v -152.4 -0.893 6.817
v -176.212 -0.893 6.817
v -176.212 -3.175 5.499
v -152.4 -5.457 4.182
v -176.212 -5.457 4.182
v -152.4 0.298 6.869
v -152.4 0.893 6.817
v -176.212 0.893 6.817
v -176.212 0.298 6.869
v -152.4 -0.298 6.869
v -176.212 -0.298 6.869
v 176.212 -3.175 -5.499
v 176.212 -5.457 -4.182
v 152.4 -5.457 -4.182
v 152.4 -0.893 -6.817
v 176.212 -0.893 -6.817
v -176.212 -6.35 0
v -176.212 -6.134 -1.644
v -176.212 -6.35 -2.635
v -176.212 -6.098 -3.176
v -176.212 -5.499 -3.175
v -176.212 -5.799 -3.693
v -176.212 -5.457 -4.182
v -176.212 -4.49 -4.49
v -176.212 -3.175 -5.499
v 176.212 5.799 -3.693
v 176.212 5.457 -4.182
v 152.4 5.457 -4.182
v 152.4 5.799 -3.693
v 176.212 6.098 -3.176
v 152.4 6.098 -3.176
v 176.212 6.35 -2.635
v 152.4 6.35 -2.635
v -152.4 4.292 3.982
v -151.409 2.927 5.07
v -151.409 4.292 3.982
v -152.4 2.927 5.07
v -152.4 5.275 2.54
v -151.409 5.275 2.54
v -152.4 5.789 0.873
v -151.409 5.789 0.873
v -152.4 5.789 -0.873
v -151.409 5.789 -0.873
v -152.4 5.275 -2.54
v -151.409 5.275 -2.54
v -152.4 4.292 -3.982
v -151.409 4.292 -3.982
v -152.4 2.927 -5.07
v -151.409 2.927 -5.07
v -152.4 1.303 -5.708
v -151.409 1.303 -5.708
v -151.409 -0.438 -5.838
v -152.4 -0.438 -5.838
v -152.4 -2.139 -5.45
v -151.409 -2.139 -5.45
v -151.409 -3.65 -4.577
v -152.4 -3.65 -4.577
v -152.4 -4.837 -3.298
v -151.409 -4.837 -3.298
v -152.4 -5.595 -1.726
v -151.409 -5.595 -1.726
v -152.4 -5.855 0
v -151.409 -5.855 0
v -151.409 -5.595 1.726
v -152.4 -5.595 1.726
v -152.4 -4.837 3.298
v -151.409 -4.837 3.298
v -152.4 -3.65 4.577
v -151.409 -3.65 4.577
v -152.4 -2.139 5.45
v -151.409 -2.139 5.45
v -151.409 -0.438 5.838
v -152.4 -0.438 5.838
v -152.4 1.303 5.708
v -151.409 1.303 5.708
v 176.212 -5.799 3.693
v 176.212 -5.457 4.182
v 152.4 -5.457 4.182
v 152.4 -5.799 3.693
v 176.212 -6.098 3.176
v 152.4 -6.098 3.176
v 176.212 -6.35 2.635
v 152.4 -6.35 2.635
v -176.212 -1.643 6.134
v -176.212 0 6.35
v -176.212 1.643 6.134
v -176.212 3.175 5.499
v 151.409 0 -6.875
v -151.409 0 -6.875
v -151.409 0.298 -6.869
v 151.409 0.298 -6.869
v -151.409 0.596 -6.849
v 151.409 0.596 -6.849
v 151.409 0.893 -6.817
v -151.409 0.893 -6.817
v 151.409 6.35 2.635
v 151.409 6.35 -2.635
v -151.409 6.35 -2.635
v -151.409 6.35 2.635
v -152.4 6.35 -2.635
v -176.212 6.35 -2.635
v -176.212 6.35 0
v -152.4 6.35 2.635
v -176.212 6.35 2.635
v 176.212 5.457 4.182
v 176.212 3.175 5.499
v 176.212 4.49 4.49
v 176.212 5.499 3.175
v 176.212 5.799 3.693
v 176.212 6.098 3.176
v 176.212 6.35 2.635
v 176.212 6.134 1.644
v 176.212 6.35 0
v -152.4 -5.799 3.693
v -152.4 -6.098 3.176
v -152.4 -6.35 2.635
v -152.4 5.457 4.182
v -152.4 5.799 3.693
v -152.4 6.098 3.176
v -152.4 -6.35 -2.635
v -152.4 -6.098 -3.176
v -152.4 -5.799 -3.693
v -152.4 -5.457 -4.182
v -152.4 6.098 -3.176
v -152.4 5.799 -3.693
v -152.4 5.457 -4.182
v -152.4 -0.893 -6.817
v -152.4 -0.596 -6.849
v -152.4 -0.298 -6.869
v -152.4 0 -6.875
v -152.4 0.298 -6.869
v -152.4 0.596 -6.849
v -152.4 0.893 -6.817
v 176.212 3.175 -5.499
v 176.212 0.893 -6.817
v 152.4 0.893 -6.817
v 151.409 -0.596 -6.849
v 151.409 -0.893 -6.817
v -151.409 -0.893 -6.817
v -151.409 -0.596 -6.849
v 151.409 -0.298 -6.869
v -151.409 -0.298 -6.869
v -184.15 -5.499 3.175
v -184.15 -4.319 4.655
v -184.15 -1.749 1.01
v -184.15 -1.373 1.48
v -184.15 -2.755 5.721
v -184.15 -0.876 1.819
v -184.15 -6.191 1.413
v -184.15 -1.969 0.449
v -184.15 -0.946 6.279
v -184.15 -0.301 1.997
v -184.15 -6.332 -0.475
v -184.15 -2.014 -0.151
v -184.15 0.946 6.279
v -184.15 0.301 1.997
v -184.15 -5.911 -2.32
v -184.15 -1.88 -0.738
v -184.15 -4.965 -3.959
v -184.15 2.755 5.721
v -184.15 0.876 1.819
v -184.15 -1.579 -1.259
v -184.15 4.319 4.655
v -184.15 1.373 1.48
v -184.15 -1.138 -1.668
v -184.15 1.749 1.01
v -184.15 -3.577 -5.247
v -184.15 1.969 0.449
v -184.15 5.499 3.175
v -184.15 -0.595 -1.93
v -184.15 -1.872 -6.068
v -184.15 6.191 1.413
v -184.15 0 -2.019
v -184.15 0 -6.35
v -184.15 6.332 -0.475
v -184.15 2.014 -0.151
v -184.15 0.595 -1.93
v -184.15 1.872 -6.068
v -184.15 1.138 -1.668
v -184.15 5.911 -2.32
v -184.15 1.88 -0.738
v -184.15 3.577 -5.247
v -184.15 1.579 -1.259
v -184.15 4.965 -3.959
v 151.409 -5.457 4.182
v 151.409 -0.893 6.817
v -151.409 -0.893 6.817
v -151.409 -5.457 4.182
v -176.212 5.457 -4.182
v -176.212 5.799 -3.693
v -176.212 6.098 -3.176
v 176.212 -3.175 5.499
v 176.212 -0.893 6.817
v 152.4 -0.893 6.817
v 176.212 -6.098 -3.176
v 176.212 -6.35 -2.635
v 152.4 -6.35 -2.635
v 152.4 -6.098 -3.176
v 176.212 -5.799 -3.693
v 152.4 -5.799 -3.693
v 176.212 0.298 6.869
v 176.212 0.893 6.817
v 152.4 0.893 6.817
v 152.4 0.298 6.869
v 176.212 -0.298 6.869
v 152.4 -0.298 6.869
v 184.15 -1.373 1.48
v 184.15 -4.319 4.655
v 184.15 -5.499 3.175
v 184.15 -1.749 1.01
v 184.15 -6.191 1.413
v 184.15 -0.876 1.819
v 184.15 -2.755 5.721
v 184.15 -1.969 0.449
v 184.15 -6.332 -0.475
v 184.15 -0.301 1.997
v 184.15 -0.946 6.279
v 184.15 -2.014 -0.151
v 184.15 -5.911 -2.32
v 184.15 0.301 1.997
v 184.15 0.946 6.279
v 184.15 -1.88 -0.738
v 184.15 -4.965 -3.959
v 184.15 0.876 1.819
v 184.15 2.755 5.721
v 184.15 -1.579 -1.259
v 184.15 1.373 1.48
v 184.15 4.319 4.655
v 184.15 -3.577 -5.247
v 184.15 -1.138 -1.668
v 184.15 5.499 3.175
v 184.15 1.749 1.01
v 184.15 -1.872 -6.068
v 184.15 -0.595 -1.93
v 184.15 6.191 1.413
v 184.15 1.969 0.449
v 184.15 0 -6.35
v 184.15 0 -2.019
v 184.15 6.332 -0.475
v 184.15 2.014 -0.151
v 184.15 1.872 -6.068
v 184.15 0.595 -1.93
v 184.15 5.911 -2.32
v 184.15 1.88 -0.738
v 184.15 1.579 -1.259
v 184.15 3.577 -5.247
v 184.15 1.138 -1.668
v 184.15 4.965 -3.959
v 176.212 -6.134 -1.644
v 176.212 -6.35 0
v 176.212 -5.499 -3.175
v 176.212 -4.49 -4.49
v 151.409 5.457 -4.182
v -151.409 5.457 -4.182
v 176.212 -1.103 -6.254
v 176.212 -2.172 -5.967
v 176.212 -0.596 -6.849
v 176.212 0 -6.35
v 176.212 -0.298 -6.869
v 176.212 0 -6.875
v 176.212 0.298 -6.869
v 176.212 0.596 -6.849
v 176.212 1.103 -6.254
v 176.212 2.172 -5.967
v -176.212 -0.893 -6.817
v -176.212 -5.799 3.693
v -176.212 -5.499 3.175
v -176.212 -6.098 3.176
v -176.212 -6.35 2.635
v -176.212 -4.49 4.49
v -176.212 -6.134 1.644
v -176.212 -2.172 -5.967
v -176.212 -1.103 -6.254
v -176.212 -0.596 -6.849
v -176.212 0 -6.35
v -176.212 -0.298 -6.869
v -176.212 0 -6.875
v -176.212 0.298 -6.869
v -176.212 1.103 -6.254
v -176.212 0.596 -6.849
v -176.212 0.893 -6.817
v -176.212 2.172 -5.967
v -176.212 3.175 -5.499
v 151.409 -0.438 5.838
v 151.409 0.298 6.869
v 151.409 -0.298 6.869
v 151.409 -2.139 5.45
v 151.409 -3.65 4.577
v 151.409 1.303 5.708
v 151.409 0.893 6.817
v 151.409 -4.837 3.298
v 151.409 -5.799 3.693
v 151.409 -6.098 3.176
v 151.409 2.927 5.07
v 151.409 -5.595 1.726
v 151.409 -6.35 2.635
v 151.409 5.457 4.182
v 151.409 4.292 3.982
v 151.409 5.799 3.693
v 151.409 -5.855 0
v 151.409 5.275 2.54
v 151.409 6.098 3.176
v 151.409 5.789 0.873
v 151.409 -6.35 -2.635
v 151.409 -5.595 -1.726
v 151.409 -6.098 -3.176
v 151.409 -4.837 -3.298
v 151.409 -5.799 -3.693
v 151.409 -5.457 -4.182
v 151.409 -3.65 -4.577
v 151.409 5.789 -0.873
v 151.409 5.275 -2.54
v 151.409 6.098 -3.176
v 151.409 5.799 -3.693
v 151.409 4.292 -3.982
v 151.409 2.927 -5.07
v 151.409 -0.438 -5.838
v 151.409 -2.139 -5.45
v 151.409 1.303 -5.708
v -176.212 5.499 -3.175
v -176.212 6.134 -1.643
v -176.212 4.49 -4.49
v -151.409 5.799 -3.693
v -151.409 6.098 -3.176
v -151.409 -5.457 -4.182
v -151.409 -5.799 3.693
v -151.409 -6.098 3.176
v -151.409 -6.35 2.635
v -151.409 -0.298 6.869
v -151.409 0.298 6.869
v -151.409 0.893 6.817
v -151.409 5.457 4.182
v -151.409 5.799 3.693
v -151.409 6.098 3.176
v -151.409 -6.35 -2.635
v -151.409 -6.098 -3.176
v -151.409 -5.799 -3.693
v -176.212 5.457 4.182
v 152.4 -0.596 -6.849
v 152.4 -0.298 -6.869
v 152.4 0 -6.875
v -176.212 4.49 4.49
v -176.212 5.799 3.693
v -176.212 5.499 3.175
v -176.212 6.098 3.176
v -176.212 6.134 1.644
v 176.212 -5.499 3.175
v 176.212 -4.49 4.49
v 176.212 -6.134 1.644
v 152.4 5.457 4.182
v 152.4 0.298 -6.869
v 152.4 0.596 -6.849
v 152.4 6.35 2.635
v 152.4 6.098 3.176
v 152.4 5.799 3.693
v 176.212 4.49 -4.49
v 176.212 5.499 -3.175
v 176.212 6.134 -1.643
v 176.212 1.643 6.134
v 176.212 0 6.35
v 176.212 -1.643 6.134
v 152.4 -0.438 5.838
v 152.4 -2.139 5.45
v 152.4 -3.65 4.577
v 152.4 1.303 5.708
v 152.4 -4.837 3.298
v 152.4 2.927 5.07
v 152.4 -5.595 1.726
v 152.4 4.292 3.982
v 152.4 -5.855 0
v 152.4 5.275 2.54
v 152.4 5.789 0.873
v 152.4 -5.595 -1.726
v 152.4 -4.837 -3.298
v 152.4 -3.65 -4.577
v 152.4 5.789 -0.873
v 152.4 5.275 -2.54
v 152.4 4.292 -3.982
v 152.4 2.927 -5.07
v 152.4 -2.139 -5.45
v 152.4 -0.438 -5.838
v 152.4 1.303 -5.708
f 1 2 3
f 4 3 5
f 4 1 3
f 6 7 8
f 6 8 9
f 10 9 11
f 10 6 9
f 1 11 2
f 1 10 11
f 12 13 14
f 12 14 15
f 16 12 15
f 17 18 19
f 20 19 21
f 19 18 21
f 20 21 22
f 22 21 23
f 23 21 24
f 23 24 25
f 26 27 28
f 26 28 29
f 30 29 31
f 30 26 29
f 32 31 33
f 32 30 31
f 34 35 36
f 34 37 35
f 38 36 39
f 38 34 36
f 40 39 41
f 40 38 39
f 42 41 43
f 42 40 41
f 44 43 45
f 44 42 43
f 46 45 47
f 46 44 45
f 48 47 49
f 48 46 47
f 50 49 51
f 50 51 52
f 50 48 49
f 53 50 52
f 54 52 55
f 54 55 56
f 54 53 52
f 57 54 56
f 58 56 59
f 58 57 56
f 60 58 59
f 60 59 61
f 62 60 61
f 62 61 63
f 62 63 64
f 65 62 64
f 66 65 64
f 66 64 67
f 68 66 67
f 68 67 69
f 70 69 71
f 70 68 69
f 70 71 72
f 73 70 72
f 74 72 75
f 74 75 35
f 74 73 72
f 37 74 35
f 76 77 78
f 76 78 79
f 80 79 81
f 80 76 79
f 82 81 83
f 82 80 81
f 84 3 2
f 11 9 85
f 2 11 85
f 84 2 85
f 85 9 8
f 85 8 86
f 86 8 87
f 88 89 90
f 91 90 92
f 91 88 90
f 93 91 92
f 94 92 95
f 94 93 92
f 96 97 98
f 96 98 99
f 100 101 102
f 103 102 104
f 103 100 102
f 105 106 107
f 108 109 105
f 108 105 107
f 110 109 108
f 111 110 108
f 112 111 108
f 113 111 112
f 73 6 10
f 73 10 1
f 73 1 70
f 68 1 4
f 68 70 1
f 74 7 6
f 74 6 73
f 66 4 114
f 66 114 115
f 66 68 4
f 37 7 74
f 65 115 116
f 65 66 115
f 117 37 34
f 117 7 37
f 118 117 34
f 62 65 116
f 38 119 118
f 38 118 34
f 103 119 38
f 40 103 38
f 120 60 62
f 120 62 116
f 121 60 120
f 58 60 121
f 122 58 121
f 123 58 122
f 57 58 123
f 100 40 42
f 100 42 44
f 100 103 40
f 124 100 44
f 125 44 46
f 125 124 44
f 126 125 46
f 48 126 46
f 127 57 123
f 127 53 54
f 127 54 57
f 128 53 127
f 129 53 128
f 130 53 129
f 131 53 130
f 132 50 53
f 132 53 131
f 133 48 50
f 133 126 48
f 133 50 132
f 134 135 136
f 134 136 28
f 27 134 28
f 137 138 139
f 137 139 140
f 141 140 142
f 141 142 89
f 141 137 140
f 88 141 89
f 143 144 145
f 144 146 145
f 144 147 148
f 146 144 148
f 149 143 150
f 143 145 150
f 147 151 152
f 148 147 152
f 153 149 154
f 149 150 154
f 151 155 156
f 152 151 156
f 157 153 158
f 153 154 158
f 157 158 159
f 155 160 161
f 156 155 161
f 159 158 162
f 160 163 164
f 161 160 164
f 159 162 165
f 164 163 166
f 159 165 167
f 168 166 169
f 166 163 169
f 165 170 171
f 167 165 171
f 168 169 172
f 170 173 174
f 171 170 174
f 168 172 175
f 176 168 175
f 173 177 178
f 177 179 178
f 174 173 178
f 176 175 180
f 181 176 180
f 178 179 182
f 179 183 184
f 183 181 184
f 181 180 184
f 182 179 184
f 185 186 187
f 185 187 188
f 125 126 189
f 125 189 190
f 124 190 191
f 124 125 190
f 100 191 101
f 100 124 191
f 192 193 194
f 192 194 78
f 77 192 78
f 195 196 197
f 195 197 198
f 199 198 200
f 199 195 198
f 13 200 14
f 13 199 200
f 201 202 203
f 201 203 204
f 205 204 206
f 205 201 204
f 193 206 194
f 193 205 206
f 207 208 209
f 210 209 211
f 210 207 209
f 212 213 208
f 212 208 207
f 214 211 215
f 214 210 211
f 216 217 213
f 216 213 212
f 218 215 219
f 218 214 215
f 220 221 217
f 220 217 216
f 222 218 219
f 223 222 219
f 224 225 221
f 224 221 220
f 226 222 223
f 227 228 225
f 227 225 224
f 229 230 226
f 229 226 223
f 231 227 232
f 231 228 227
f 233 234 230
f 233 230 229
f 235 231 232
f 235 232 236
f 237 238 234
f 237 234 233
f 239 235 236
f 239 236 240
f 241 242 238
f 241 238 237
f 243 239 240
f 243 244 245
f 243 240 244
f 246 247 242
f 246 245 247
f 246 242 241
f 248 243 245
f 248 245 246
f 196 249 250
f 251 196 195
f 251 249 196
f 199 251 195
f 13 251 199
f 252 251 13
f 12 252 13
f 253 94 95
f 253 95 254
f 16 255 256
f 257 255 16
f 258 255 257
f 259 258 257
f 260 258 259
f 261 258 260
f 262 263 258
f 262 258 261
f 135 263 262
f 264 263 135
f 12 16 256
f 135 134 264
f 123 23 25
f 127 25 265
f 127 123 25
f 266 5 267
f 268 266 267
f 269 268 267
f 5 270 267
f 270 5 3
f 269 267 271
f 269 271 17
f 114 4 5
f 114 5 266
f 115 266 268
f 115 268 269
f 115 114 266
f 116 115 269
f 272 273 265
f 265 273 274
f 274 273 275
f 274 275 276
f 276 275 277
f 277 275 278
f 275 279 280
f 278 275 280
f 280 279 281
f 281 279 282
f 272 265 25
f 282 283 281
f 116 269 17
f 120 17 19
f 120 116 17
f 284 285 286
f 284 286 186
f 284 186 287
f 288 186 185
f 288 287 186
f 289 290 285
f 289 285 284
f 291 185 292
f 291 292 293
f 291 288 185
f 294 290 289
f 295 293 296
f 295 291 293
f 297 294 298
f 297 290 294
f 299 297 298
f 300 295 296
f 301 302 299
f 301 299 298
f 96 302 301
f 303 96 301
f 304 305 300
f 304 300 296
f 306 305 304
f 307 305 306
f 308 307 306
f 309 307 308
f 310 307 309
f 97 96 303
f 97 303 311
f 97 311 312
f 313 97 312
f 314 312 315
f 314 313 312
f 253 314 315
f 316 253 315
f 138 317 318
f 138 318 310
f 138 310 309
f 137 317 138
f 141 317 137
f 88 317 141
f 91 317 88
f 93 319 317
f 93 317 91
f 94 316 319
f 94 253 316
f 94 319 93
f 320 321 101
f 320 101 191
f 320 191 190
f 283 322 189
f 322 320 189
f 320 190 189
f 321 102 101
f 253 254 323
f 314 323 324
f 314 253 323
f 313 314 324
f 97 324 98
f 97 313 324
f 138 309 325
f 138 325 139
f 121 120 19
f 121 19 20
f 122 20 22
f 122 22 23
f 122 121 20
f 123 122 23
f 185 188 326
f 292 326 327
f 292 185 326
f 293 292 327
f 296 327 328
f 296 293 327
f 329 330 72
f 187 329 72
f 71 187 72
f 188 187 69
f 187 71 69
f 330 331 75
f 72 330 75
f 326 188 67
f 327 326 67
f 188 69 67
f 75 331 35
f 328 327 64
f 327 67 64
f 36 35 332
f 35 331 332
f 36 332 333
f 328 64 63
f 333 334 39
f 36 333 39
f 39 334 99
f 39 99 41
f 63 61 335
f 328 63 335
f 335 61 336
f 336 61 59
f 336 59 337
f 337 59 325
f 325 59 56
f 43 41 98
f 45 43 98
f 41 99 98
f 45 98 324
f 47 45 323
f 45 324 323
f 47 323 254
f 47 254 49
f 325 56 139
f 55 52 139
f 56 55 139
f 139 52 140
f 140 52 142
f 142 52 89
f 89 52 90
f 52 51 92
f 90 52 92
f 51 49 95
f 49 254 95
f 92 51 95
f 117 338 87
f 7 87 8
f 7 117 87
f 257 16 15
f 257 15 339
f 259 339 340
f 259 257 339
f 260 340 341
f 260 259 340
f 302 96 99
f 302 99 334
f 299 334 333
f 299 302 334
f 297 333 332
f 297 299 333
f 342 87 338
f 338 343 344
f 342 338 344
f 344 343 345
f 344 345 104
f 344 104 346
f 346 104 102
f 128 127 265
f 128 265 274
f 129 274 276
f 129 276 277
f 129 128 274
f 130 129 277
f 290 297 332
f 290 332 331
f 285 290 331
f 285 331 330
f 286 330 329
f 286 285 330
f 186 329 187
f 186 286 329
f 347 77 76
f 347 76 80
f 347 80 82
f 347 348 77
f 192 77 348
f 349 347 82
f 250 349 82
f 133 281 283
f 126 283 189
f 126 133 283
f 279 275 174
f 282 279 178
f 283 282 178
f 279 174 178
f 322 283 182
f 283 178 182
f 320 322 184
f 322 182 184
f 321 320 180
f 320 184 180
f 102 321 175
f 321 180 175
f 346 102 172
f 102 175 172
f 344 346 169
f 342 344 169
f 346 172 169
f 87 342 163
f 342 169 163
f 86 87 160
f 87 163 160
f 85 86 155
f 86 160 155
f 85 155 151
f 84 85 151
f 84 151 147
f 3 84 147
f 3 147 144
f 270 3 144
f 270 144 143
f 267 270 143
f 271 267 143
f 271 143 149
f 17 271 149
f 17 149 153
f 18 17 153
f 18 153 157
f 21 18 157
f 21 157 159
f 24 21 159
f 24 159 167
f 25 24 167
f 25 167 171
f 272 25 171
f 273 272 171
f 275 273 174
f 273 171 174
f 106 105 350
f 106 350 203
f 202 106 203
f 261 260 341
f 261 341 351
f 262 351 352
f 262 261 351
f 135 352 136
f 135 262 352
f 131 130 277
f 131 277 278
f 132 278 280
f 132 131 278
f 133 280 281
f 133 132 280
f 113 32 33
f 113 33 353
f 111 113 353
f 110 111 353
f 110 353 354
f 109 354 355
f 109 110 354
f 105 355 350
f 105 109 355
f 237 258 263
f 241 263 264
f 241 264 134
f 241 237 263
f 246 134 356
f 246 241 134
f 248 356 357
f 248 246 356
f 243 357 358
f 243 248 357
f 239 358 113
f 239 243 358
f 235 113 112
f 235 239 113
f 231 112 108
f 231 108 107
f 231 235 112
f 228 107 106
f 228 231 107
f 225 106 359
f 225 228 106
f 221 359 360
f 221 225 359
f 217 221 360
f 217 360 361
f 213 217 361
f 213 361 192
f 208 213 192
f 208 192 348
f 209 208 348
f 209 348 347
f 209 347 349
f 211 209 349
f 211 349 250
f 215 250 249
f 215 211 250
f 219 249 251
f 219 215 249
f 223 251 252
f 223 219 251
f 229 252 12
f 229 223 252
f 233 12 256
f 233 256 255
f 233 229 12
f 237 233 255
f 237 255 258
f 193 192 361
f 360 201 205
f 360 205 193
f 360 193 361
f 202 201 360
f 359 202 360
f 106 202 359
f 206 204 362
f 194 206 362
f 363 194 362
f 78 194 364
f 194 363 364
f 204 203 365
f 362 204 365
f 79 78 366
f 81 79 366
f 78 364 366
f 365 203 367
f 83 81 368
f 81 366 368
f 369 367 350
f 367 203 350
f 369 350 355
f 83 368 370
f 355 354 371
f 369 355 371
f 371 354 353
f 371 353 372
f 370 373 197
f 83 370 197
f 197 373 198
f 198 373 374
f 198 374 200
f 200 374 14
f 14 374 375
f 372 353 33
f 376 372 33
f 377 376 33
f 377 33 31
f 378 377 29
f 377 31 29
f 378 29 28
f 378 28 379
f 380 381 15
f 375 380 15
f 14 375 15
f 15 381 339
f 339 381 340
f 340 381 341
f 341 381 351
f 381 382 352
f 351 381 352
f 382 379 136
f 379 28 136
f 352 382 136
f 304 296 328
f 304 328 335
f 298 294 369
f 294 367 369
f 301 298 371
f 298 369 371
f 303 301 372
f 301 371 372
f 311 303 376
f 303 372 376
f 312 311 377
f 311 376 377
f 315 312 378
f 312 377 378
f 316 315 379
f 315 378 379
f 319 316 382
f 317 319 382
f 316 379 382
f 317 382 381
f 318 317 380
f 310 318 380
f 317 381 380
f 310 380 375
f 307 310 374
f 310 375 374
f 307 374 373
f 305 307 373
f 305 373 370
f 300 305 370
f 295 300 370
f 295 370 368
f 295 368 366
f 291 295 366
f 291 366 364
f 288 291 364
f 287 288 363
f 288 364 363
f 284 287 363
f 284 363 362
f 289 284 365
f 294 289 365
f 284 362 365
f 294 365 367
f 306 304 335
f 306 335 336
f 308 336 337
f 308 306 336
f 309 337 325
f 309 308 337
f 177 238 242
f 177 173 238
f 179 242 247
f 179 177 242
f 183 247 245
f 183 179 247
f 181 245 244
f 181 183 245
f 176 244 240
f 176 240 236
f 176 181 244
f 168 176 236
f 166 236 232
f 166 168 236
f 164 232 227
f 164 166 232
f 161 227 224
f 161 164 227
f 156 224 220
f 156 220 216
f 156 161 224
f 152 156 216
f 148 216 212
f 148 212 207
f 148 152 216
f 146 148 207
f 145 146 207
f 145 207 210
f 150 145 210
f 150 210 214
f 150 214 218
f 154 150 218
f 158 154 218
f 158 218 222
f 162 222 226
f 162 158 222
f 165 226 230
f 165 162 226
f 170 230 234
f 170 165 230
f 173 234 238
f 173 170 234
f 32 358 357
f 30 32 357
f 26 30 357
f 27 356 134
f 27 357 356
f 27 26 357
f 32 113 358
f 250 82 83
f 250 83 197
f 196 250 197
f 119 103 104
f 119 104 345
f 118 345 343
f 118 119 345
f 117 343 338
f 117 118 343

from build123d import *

# Parameters (mm, degrees)
SKETCH1_R               = 2.0193
BOSS_EXTRUDE1_DEPTH     = 184.15
SKETCH2_R               = 8.89
SKETCH2_R_2             = 6.35
CUT_EXTRUDE_THIN1_DEPTH = 7.9375
SKETCH4_W               = 0.9906
SKETCH4_H               = 2.802626001


with BuildPart() as part:
    # Sketch1 → Boss-Extrude1 (new, symmetric)
    with BuildSketch(Plane(origin=(0, 0, 0), x_dir=(0, 0, -1), z_dir=(1, 0, 0))):
        with BuildLine():
            ThreePointArc((6.874999966, 0), (6.860422465, 0.447468582), (6.816751782, 0.893039571))
            Line((6.816751782, 0.893039571), (4.181770846, 5.456960429))
            ThreePointArc((4.181770846, 5.456960429), (3.437499983, 5.953924622), (2.634980936, 6.35))
            Line((2.634980936, 6.35), (-2.634980936, 6.35))
            ThreePointArc((-2.634980936, 6.35), (-3.437499983, 5.953924622), (-4.181770846, 5.456960429))
            Line((-4.181770846, 5.456960429), (-6.816751782, 0.893039571))
            ThreePointArc((-6.816751782, 0.893039571), (-6.874999966, 0), (-6.816751782, -0.893039571))
            Line((-6.816751782, -0.893039571), (-4.181770846, -5.456960429))
            ThreePointArc((-4.181770846, -5.456960429), (-3.437499983, -5.953924622), (-2.634980936, -6.35))
            Line((-2.634980936, -6.35), (2.634980936, -6.35))
            ThreePointArc((2.634980936, -6.35), (3.437499983, -5.953924622), (4.181770846, -5.456960429))
            Line((4.181770846, -5.456960429), (6.816751782, -0.893039571))
            ThreePointArc((6.816751782, -0.893039571), (6.860422465, -0.447468582), (6.874999966, 0))
        make_face()
        Circle(SKETCH1_R, mode=Mode.SUBTRACT)
    extrude(amount=BOSS_EXTRUDE1_DEPTH, both=True)

    # Sketch2 → Cut-Extrude-Thin1 (cut)
    with BuildSketch(Plane(origin=(184.15, 0, 0), x_dir=(0, 0, -1), z_dir=(1, 0, 0))):
        Circle(SKETCH2_R)
        Circle(SKETCH2_R_2, mode=Mode.SUBTRACT)
    cut_extrude_thin1 = extrude(amount=-CUT_EXTRUDE_THIN1_DEPTH, mode=Mode.SUBTRACT)

    # Mirror1: Cut-Extrude-Thin1 across plane
    add(cut_extrude_thin1.mirror(Plane(origin=(0, 0, 0), x_dir=(0, 0, 1), z_dir=(1, 0, 0))), mode=Mode.SUBTRACT)

    # Sketch4 → Cut-Revolve7 (revolve, cut)
    with BuildSketch(Plane.XY, mode=Mode.PRIVATE) as cut_revolve7_sk:
        with Locations((151.9047, 7.256013001)):
            Rectangle(SKETCH4_W, SKETCH4_H)
    cut_revolve7 = revolve(cut_revolve7_sk.sketch.rotate(Axis((184.15, 0, 0), (-1, 0, 0)), 300), axis=Axis((184.15, 0, 0), (-1, 0, 0)), mode=Mode.SUBTRACT)

    # Mirror2: Cut-Revolve7 across plane
    add(cut_revolve7.mirror(Plane(origin=(0, 0, 0), x_dir=(0, 0, 1), z_dir=(1, 0, 0))), mode=Mode.SUBTRACT)


solid = part.part
